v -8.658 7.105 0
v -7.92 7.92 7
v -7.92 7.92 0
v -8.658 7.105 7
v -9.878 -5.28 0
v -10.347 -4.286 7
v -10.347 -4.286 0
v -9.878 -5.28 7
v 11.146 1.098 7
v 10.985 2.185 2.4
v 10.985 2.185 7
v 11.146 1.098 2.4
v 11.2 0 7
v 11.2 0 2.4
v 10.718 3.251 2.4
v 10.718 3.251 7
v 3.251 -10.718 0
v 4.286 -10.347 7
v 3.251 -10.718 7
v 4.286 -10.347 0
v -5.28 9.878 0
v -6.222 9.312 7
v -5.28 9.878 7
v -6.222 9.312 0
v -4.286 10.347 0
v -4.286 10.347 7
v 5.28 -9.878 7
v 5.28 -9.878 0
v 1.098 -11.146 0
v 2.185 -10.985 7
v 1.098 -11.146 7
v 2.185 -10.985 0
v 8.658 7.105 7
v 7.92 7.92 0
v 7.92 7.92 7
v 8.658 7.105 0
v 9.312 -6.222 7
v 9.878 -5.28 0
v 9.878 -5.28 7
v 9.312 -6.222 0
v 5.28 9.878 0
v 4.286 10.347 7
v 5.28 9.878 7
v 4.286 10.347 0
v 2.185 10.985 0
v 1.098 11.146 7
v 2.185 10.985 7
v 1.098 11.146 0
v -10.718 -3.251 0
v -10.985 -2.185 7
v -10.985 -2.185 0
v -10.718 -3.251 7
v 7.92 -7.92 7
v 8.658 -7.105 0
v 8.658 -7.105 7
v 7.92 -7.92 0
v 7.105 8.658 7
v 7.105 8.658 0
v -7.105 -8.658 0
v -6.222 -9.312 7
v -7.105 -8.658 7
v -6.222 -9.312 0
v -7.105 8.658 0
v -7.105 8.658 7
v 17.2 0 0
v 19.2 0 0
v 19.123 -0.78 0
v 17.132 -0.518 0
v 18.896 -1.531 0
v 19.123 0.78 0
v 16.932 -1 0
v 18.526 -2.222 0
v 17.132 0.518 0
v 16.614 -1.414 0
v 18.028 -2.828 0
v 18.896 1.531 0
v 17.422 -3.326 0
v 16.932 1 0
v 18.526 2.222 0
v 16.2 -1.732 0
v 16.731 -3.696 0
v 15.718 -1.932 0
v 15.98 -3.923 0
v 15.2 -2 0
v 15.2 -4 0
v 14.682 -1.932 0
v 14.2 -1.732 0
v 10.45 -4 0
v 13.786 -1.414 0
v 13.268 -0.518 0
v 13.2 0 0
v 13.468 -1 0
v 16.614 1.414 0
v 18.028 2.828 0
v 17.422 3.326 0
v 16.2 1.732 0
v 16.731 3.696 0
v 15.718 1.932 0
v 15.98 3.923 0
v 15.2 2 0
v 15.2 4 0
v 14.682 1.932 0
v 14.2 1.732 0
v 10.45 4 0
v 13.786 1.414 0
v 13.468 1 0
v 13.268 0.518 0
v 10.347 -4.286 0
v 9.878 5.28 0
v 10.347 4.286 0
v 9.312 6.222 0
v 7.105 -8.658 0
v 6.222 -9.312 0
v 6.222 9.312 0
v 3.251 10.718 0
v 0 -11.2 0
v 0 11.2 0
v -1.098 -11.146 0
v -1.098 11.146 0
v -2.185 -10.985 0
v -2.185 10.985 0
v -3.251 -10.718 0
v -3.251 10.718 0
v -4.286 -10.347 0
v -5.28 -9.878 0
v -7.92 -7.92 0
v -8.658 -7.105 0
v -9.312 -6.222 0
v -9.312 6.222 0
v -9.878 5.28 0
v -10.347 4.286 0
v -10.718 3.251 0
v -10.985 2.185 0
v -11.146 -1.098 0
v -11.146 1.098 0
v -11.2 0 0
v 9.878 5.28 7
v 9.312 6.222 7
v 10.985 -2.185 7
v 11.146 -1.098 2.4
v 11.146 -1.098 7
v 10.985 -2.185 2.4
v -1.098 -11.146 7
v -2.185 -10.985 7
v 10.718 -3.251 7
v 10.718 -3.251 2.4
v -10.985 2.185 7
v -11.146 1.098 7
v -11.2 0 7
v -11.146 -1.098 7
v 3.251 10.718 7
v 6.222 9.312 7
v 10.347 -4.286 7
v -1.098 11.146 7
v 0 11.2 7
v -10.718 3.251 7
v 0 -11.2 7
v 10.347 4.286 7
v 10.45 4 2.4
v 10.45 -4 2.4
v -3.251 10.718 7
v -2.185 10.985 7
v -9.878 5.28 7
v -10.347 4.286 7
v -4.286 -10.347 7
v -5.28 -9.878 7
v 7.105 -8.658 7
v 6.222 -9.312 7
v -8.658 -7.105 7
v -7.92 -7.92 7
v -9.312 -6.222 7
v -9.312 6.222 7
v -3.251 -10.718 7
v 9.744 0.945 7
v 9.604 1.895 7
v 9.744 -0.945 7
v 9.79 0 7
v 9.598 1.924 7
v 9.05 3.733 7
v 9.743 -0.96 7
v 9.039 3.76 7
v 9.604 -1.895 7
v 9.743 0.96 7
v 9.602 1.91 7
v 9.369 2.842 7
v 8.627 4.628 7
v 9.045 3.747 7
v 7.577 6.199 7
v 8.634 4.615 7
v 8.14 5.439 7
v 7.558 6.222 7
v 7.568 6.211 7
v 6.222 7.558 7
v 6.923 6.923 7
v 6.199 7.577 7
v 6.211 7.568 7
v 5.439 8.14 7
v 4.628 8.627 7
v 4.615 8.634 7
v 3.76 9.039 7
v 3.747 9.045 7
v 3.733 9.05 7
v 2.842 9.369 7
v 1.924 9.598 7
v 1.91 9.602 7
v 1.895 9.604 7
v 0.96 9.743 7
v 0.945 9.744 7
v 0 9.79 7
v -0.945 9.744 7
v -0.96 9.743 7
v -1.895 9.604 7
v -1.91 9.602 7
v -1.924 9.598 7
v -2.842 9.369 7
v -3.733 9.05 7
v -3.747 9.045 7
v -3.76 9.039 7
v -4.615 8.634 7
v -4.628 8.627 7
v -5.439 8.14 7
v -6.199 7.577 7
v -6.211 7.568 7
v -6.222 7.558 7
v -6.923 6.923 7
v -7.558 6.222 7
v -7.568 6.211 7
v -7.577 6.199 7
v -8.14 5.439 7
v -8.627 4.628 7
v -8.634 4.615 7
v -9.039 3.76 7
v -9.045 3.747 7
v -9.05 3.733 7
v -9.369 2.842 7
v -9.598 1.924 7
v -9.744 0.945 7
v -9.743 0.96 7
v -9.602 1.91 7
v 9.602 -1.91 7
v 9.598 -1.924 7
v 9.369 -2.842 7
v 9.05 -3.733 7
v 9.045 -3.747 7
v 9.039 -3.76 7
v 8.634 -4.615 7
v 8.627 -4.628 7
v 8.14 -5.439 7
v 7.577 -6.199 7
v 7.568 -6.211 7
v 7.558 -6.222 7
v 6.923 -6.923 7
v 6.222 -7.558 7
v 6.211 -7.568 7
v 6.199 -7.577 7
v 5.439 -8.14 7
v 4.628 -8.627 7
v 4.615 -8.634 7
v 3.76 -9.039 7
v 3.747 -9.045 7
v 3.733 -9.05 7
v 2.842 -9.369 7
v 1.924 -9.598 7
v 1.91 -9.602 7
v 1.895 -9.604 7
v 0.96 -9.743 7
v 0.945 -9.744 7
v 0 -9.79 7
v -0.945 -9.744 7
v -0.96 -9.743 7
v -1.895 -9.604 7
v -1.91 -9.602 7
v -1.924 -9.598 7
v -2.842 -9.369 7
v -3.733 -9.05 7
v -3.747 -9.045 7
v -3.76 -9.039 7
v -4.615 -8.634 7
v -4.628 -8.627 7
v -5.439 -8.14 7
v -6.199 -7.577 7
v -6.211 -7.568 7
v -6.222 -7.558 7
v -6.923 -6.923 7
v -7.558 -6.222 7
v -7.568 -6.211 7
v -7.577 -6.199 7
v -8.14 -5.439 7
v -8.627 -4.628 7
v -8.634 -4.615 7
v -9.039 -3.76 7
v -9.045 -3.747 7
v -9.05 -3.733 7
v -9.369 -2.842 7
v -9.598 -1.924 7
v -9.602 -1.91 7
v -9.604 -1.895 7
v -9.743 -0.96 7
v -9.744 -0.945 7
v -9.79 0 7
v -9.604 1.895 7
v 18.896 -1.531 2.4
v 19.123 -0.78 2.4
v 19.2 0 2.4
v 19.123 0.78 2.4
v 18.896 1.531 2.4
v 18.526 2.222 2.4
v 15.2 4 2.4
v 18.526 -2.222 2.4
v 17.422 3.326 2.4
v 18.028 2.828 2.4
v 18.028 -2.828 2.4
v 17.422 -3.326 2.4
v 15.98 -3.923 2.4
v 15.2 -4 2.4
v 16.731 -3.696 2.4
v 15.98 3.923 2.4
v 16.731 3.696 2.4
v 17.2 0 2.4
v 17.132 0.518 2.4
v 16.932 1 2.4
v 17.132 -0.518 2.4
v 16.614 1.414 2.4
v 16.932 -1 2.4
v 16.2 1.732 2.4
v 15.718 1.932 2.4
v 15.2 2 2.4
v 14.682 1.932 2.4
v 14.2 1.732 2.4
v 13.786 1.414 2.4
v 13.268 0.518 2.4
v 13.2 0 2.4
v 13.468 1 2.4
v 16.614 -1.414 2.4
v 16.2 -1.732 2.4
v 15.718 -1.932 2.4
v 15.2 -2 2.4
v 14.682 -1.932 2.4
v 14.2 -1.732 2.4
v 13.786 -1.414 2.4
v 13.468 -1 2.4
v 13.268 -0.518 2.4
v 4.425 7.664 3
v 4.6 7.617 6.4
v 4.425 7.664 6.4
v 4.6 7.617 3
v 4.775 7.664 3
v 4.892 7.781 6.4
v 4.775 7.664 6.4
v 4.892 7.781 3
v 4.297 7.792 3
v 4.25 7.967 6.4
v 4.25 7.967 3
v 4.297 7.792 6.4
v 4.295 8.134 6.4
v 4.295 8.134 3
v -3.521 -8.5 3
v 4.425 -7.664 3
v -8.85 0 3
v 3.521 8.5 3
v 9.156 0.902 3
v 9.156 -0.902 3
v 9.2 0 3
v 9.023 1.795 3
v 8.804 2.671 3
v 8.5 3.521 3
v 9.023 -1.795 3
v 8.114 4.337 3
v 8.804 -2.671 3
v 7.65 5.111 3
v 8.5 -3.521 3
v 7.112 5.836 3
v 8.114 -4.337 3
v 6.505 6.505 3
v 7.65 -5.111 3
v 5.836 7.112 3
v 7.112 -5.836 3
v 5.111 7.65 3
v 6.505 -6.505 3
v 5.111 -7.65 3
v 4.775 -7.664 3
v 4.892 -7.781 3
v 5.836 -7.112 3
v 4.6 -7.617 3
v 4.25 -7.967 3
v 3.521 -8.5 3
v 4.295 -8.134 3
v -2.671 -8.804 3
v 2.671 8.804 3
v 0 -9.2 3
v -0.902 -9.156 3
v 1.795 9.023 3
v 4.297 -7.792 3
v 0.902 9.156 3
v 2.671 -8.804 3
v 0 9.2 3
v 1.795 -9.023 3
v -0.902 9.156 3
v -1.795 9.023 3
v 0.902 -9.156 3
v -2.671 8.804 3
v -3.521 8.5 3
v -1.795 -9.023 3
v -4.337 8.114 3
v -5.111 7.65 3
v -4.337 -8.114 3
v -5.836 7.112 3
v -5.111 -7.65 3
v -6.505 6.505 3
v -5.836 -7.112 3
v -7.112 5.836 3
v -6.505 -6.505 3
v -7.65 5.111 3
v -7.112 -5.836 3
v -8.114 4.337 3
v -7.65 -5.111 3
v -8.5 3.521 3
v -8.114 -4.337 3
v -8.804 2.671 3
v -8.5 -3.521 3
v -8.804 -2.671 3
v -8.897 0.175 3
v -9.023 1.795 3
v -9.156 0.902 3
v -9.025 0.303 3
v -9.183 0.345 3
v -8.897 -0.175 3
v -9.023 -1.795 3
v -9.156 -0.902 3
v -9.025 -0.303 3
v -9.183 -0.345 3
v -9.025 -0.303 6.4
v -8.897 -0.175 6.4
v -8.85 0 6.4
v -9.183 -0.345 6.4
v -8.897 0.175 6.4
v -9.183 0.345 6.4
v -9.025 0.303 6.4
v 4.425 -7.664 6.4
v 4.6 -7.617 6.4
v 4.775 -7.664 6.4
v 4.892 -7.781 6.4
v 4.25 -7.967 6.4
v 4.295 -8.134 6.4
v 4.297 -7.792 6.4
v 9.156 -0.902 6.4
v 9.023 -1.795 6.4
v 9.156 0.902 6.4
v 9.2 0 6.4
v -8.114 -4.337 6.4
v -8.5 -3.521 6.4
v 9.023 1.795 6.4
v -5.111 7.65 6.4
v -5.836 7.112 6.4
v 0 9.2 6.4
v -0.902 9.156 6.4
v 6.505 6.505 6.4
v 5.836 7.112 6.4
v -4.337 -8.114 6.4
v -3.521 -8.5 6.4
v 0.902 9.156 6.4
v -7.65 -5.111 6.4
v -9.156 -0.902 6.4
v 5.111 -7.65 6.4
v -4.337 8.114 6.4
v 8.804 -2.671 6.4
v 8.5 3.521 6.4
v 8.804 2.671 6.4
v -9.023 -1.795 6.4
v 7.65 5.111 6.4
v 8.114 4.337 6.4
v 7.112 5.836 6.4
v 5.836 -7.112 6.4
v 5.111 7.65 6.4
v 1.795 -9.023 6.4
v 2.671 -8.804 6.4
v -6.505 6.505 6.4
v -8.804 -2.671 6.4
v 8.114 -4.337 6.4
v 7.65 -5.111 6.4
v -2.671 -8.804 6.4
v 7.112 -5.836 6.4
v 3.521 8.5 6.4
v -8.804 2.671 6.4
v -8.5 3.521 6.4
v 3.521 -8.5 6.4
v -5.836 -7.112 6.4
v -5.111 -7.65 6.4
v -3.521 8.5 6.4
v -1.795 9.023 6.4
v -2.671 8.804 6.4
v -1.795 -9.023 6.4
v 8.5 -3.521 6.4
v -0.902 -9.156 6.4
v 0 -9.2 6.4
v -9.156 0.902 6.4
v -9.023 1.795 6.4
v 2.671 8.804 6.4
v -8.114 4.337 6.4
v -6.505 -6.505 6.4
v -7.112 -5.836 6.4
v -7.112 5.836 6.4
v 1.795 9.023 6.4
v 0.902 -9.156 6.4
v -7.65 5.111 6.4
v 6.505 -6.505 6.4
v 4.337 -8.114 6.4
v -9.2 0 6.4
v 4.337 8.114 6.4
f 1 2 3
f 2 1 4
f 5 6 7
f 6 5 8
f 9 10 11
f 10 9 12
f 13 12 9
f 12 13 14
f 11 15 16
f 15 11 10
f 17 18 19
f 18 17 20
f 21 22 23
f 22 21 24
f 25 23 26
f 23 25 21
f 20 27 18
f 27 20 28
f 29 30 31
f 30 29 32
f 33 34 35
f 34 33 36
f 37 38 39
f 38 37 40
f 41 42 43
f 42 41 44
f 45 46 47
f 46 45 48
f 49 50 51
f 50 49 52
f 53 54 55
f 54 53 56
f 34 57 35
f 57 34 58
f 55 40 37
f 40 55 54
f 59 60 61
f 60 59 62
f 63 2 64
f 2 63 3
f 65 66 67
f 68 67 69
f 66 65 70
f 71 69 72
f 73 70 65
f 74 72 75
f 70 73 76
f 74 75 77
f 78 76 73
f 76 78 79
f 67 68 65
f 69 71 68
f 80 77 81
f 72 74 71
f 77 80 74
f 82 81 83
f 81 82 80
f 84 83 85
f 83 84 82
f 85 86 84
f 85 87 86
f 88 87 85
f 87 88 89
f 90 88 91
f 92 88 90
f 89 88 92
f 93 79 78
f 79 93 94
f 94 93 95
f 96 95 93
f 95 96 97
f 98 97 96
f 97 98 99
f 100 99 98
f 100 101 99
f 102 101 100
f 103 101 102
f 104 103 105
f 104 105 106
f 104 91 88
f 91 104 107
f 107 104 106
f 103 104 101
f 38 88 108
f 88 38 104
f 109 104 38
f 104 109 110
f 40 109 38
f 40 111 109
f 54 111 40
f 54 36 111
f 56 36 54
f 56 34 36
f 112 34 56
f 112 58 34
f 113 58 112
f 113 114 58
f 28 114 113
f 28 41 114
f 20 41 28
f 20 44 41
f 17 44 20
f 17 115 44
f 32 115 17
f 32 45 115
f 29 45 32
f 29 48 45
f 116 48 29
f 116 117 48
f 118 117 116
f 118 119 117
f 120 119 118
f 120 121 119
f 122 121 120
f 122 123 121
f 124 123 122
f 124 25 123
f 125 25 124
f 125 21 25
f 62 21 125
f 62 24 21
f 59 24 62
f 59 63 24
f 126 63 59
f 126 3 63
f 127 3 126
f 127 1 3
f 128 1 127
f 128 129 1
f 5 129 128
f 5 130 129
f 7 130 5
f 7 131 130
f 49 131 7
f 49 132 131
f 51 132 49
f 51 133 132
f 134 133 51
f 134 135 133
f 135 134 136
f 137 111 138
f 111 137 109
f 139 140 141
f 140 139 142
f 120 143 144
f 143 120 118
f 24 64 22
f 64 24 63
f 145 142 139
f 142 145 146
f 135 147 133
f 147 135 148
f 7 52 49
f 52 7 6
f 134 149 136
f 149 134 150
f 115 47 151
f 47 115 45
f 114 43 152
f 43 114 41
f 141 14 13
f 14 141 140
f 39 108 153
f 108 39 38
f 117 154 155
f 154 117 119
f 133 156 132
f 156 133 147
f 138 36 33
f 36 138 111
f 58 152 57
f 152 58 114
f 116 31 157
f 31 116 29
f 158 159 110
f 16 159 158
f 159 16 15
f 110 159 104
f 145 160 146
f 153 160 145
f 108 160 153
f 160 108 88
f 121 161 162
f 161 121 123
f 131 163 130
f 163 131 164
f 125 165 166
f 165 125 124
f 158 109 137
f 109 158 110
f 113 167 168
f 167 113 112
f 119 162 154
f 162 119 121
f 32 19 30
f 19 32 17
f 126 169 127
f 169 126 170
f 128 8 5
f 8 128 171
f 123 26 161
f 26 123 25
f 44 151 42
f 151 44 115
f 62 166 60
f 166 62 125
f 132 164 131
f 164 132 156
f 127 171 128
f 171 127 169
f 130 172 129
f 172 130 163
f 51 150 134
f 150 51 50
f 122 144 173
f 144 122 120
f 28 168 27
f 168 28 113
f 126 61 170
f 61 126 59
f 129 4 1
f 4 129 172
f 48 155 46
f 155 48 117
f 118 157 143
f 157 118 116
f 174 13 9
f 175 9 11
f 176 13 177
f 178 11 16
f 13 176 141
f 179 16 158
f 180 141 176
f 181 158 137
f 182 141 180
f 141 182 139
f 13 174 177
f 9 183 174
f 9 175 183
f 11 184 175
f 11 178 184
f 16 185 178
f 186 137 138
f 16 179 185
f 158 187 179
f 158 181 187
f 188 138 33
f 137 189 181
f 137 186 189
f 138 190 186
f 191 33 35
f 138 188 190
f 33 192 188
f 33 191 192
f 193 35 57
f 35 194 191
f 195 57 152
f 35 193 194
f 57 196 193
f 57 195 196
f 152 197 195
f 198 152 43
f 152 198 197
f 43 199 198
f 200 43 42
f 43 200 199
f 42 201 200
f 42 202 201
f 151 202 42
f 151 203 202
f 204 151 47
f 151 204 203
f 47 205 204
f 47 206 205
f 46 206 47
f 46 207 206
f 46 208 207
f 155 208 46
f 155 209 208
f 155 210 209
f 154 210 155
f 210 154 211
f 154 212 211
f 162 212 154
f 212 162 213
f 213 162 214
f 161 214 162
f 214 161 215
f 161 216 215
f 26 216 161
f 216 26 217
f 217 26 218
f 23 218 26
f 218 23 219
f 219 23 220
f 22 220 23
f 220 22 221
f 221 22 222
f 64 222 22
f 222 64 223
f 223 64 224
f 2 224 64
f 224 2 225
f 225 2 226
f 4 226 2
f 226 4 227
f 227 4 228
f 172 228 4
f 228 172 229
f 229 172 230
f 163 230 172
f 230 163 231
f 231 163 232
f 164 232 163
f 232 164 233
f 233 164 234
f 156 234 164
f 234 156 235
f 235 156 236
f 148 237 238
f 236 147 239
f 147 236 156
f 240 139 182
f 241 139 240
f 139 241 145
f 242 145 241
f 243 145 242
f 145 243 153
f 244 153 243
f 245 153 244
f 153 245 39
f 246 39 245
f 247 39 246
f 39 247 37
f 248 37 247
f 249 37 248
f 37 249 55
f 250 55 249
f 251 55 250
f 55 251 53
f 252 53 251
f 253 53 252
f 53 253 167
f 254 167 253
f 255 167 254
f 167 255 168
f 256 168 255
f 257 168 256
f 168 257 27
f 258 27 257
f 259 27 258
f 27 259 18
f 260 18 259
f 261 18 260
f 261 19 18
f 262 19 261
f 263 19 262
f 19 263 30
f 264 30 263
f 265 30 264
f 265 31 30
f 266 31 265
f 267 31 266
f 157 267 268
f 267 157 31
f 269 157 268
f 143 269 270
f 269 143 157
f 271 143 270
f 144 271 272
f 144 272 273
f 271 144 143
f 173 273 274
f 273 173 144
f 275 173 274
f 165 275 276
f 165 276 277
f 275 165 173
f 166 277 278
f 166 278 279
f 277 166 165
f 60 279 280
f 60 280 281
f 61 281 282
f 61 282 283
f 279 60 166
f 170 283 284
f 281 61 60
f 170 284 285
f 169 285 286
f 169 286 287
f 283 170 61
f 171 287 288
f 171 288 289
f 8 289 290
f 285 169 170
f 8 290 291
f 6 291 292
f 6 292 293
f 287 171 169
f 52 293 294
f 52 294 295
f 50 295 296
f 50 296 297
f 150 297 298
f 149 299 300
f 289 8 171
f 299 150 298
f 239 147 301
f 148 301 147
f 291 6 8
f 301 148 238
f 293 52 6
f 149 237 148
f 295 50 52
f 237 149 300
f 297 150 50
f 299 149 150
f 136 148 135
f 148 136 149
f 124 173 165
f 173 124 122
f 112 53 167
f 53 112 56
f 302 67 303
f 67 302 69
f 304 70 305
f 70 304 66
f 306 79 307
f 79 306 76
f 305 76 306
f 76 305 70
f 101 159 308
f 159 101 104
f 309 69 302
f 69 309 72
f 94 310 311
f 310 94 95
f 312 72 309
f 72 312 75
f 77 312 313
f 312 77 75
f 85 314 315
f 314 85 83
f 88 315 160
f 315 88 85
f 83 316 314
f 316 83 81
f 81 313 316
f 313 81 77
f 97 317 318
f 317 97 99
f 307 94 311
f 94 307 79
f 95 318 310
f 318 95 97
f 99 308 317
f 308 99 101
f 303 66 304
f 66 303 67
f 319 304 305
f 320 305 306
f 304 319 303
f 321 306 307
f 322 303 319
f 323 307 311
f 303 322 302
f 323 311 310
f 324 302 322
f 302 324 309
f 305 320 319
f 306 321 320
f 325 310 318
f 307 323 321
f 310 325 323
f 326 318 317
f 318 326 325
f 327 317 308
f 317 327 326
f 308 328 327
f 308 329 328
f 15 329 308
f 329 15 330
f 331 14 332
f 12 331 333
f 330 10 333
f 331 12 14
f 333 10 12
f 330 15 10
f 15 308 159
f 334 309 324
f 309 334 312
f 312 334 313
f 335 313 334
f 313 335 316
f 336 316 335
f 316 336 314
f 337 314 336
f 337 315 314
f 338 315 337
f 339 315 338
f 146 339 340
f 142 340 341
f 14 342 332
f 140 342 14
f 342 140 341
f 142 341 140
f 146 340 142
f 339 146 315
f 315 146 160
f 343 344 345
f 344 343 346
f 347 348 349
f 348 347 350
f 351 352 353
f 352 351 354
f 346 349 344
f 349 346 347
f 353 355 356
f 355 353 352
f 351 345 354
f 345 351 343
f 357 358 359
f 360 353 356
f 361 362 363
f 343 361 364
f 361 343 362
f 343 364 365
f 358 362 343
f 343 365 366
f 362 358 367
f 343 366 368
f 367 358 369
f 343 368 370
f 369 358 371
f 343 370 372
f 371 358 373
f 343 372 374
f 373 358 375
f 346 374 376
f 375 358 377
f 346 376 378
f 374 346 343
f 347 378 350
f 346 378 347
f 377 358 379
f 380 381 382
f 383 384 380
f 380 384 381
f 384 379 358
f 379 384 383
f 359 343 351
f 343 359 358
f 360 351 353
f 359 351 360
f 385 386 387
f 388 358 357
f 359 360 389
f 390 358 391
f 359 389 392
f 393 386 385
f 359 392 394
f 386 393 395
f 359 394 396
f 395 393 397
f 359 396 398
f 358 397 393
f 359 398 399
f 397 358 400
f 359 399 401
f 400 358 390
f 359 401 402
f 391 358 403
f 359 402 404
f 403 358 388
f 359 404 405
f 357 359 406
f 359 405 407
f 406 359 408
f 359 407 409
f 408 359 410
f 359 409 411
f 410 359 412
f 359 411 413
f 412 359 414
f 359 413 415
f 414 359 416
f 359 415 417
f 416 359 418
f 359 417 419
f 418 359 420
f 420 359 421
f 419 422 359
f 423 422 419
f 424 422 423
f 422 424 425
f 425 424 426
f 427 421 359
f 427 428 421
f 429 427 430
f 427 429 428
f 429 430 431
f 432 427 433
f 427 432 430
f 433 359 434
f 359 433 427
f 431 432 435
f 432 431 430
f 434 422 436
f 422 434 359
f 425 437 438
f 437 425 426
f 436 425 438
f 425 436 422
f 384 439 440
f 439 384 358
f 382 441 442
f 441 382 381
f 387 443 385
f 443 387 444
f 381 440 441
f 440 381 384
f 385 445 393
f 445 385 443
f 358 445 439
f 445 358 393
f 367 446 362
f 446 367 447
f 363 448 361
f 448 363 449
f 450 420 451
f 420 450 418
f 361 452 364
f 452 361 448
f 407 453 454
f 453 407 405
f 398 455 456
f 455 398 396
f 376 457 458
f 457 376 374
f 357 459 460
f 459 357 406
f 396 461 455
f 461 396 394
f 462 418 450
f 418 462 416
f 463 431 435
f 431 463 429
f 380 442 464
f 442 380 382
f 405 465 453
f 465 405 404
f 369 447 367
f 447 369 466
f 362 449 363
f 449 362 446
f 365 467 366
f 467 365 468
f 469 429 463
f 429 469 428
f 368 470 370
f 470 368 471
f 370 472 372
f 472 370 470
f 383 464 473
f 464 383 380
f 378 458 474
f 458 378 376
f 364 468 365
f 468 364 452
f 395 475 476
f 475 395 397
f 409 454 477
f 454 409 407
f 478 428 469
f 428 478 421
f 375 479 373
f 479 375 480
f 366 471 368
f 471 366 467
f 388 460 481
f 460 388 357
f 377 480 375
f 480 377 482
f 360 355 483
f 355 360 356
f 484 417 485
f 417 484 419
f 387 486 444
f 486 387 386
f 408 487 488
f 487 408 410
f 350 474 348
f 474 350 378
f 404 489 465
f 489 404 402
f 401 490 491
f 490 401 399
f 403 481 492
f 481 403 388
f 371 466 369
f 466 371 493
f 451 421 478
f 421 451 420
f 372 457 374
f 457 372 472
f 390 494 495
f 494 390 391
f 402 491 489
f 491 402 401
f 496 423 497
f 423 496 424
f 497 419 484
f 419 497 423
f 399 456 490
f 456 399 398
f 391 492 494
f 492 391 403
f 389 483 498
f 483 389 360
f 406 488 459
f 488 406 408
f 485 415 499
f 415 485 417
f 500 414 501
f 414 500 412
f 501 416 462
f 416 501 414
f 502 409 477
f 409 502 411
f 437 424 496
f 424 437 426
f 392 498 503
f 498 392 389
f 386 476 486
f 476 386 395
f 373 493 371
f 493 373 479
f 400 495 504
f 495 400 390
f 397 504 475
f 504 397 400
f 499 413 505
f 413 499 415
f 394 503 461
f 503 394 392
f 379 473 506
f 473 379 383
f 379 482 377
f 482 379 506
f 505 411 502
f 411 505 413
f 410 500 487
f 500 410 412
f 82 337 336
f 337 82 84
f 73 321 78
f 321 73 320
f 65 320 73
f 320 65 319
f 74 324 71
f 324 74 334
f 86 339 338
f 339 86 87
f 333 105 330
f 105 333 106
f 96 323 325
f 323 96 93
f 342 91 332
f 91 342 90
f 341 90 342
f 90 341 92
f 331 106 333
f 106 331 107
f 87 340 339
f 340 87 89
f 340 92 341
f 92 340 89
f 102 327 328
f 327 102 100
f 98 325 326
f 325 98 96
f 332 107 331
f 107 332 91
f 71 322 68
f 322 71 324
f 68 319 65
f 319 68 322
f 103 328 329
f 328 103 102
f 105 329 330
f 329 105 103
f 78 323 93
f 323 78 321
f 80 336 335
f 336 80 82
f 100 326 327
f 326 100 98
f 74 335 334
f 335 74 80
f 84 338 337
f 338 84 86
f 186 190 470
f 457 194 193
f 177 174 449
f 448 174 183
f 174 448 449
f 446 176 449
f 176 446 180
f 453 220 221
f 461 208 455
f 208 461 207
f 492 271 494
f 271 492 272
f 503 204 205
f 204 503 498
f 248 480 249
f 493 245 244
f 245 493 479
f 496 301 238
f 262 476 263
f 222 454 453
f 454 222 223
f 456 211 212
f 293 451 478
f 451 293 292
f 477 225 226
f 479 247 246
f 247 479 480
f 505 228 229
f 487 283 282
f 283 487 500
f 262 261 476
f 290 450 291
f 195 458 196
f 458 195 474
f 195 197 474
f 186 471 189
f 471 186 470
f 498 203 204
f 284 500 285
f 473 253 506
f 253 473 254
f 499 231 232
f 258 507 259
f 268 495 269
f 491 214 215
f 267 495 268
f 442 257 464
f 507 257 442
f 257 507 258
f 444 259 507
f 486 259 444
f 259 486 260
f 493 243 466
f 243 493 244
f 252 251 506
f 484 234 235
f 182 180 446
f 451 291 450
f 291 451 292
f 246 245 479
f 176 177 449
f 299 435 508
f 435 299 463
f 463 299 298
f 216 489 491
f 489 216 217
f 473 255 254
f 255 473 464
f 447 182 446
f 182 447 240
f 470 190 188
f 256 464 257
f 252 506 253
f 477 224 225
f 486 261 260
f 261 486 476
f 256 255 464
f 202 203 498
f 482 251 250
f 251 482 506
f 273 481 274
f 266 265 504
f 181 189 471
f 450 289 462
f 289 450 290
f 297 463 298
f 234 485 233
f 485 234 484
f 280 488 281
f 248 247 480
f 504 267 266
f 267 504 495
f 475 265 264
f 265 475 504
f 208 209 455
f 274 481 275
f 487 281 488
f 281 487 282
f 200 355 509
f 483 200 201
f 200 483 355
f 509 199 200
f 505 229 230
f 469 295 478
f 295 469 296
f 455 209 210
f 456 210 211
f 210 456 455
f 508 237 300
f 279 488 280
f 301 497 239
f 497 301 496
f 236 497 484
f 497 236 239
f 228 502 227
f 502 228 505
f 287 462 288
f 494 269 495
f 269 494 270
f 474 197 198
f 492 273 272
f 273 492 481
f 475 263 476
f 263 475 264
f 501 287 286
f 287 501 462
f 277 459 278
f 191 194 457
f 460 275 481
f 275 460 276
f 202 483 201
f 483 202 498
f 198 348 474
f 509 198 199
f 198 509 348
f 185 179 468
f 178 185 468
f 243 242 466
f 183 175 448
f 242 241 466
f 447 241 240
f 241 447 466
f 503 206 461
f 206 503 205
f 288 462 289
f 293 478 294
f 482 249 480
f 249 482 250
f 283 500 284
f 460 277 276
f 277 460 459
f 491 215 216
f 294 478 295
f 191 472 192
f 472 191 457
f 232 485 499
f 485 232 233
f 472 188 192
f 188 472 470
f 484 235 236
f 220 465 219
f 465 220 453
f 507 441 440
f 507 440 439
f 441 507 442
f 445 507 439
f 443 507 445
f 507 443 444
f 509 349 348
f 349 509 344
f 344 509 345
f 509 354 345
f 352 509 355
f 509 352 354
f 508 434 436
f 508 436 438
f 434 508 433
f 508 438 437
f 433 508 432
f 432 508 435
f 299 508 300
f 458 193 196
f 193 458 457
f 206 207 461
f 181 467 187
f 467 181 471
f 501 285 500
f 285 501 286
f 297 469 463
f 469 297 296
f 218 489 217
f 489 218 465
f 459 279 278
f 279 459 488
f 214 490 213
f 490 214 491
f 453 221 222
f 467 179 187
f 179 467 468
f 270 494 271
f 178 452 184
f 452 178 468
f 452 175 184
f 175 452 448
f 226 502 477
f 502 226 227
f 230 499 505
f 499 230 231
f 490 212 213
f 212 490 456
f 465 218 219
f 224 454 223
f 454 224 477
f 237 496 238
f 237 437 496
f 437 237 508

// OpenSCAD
// file: ../lib/gears.scad
// =====================================================================
//  laser-gimbal :: involute spur / herringbone gears (no external libs)
//  use <../lib/gears.scad>
//
//  gear2d(m, z)                         2D involute profile, centred, tooth 0 on +X
//  herringbone(m, z, w, helix)          3D gear z = 0..w. Mating gears use OPPOSITE helix sign.
//  mesh_phase(z_wheel, z_pinion, ang)   rotation (deg) to apply to a pinion placed at polar angle
//                                       `ang` around a wheel (wheel at rotation 0) so teeth interleave.
// =====================================================================

// involute function, a in degrees -> radians
function _inv(a) = tan(a) - a * PI / 180;

// half tooth angle (degrees) at radius r
function _half_ang(r, rb, halfp_rad, pa) =
    (halfp_rad + _inv(pa) - (r <= rb ? 0 : _inv(acos(rb / r)))) * 180 / PI;

module gear2d(m, z, pa = 20, backlash = 0.15, steps = 10) {
    rp = m * z / 2;
    rb = rp * cos(pa);
    ra = rp + m;
    rf = rp - 1.25 * m;
    halfp = (PI * m / 2 - backlash / 2) / (2 * rp);      // half tooth thickness angle at pitch (rad)
    r0 = max(rb, rf);
    rs = [for (i = [0 : steps]) r0 + (ra - r0) * i / steps];
    a0 = _half_ang(r0, rb, halfp, pa);
    root_pts = rf < rb ? [[rf * cos(-a0), rf * sin(-a0)]] : [];
    root_pts2 = rf < rb ? [[rf * cos(a0), rf * sin(a0)]] : [];
    tooth = concat(
        [[(rf - 0.5) * cos(-a0), (rf - 0.5) * sin(-a0)]],
        root_pts,
        [for (r = rs) let(a = _half_ang(r, rb, halfp, pa)) [r * cos(-a), r * sin(-a)]],
        [for (j = [steps : -1 : 0]) let(r = rs[j], a = _half_ang(r, rb, halfp, pa)) [r * cos(a), r * sin(a)]],
        root_pts2,
        [[(rf - 0.5) * cos(a0), (rf - 0.5) * sin(a0)]]
    );
    union() {
        circle(r = rf, $fn = max(z * 4, 64));
        for (i = [0 : z - 1]) rotate(i * 360 / z) polygon(tooth);
    }
}

// twist (deg) over height h for helix angle at pitch radius
function _twist(m, z, h, helix) = h * tan(helix) / (m * z / 2) * 180 / PI;

module herringbone(m, z, w, helix = 20, pa = 20, backlash = 0.15) {
    tw = _twist(m, z, w / 2, helix);
    slices = max(4, ceil(w / 0.8));
    linear_extrude(height = w / 2 + 0.001, twist = tw, slices = slices, convexity = 10)
        gear2d(m, z, pa, backlash);
    translate([0, 0, w / 2])
        rotate([0, 0, -tw])
            linear_extrude(height = w / 2, twist = -tw, slices = slices, convexity = 10)
                gear2d(m, z, pa, backlash);
}

// Pinion phase so its teeth interleave with a wheel whose tooth 0 is on +X.
// Pinion centre sits at polar angle `ang` from the wheel centre.
function mesh_phase(z_wheel, z_pinion, ang) =
    // a wheel gap faces the pinion if the wheel is at 0 and ang is a tooth-centre angle;
    // rotate the pinion so a pinion tooth points back at the wheel centre (into that gap)
    // Nearest wheel tooth sits delta behind the line of centres == wheel rotated by -delta from the
    // aligned case; meshing turns the pinion the opposite way by delta * z_wheel / z_pinion.
    let(
        delta = ang - round(ang / (360 / z_wheel)) * (360 / z_wheel),
        aligned = 180 + ang - 180 / z_pinion   // pinion GAP points back at a wheel tooth on the centre line
    )
    aligned + delta * z_wheel / z_pinion;
// main file
// =====================================================================
//  laser-gimbal :: beam-stop cap
//  Push-fit cap over the laser exit collar (OD 18, x 42..46 on laser_axis).
//  Solid 3 mm end blocks the beam completely: fit it whenever the gimbal is
//  being assembled, tested or tuned. Print in BLACK / opaque filament,
//  100% infill for the end disc. Tether loop: tie it to the yoke with a
//  short cord so it is always at hand.
//  world: tilt = 0, on the collar.
//  Print: end face on the bed (as local).
// =====================================================================
include <../lib/params.scad>
use <../lib/gears.scad>

bs_bore  = laser_collar[0] + 0.4;   // 18.4 + 3 crush ribs -> light interference
bs_rib   = 0.35;
bs_depth = laser_collar[1];         // covers the whole collar
bs_end   = 3;
bs_wall  = 2;
bs_od    = bs_bore + 2 * bs_wall;
bs_len   = bs_end + bs_depth;

module beam_stop_local() {
    difference() {
        union() {
            cylinder(h = bs_len, d = bs_od, $fn = 64);
            // tether tab with a 4 mm hole, lying on the bed
            hull() {
                cylinder(h = 2.4, d = 8, $fn = 32);
                translate([bs_od / 2 + 4, 0, 0]) cylinder(h = 2.4, d = 8, $fn = 32);
            }
        }
        translate([bs_od / 2 + 4, 0, -1]) cylinder(h = 5, d = 4, $fn = 24);
        translate([0, 0, bs_end]) difference() {
            cylinder(h = bs_depth + 1, d = bs_bore, $fn = 64);
            for (a = [0, 120, 240]) rotate([0, 0, a + 60]) translate([bs_bore / 2, 0, 0])
                cylinder(h = bs_depth + 1, d = 2 * bs_rib, $fn = 12);
        }
        // mouth chamfer
        translate([0, 0, bs_len - 0.6]) cylinder(h = 0.61, d1 = bs_bore, d2 = bs_bore + 1.2, $fn = 64);
    }
}

// local z = 0 (end face) sits in front of the collar at x = 49, mouth faces -X
module beam_stop() {
    translate([42 + bs_len, laser_axis[1], laser_axis[2]]) rotate([0, -90, 0]) beam_stop_local();   // tether tab points up (+Z)
}

module beam_stop_print() { beam_stop_local(); }

beam_stop_print();
